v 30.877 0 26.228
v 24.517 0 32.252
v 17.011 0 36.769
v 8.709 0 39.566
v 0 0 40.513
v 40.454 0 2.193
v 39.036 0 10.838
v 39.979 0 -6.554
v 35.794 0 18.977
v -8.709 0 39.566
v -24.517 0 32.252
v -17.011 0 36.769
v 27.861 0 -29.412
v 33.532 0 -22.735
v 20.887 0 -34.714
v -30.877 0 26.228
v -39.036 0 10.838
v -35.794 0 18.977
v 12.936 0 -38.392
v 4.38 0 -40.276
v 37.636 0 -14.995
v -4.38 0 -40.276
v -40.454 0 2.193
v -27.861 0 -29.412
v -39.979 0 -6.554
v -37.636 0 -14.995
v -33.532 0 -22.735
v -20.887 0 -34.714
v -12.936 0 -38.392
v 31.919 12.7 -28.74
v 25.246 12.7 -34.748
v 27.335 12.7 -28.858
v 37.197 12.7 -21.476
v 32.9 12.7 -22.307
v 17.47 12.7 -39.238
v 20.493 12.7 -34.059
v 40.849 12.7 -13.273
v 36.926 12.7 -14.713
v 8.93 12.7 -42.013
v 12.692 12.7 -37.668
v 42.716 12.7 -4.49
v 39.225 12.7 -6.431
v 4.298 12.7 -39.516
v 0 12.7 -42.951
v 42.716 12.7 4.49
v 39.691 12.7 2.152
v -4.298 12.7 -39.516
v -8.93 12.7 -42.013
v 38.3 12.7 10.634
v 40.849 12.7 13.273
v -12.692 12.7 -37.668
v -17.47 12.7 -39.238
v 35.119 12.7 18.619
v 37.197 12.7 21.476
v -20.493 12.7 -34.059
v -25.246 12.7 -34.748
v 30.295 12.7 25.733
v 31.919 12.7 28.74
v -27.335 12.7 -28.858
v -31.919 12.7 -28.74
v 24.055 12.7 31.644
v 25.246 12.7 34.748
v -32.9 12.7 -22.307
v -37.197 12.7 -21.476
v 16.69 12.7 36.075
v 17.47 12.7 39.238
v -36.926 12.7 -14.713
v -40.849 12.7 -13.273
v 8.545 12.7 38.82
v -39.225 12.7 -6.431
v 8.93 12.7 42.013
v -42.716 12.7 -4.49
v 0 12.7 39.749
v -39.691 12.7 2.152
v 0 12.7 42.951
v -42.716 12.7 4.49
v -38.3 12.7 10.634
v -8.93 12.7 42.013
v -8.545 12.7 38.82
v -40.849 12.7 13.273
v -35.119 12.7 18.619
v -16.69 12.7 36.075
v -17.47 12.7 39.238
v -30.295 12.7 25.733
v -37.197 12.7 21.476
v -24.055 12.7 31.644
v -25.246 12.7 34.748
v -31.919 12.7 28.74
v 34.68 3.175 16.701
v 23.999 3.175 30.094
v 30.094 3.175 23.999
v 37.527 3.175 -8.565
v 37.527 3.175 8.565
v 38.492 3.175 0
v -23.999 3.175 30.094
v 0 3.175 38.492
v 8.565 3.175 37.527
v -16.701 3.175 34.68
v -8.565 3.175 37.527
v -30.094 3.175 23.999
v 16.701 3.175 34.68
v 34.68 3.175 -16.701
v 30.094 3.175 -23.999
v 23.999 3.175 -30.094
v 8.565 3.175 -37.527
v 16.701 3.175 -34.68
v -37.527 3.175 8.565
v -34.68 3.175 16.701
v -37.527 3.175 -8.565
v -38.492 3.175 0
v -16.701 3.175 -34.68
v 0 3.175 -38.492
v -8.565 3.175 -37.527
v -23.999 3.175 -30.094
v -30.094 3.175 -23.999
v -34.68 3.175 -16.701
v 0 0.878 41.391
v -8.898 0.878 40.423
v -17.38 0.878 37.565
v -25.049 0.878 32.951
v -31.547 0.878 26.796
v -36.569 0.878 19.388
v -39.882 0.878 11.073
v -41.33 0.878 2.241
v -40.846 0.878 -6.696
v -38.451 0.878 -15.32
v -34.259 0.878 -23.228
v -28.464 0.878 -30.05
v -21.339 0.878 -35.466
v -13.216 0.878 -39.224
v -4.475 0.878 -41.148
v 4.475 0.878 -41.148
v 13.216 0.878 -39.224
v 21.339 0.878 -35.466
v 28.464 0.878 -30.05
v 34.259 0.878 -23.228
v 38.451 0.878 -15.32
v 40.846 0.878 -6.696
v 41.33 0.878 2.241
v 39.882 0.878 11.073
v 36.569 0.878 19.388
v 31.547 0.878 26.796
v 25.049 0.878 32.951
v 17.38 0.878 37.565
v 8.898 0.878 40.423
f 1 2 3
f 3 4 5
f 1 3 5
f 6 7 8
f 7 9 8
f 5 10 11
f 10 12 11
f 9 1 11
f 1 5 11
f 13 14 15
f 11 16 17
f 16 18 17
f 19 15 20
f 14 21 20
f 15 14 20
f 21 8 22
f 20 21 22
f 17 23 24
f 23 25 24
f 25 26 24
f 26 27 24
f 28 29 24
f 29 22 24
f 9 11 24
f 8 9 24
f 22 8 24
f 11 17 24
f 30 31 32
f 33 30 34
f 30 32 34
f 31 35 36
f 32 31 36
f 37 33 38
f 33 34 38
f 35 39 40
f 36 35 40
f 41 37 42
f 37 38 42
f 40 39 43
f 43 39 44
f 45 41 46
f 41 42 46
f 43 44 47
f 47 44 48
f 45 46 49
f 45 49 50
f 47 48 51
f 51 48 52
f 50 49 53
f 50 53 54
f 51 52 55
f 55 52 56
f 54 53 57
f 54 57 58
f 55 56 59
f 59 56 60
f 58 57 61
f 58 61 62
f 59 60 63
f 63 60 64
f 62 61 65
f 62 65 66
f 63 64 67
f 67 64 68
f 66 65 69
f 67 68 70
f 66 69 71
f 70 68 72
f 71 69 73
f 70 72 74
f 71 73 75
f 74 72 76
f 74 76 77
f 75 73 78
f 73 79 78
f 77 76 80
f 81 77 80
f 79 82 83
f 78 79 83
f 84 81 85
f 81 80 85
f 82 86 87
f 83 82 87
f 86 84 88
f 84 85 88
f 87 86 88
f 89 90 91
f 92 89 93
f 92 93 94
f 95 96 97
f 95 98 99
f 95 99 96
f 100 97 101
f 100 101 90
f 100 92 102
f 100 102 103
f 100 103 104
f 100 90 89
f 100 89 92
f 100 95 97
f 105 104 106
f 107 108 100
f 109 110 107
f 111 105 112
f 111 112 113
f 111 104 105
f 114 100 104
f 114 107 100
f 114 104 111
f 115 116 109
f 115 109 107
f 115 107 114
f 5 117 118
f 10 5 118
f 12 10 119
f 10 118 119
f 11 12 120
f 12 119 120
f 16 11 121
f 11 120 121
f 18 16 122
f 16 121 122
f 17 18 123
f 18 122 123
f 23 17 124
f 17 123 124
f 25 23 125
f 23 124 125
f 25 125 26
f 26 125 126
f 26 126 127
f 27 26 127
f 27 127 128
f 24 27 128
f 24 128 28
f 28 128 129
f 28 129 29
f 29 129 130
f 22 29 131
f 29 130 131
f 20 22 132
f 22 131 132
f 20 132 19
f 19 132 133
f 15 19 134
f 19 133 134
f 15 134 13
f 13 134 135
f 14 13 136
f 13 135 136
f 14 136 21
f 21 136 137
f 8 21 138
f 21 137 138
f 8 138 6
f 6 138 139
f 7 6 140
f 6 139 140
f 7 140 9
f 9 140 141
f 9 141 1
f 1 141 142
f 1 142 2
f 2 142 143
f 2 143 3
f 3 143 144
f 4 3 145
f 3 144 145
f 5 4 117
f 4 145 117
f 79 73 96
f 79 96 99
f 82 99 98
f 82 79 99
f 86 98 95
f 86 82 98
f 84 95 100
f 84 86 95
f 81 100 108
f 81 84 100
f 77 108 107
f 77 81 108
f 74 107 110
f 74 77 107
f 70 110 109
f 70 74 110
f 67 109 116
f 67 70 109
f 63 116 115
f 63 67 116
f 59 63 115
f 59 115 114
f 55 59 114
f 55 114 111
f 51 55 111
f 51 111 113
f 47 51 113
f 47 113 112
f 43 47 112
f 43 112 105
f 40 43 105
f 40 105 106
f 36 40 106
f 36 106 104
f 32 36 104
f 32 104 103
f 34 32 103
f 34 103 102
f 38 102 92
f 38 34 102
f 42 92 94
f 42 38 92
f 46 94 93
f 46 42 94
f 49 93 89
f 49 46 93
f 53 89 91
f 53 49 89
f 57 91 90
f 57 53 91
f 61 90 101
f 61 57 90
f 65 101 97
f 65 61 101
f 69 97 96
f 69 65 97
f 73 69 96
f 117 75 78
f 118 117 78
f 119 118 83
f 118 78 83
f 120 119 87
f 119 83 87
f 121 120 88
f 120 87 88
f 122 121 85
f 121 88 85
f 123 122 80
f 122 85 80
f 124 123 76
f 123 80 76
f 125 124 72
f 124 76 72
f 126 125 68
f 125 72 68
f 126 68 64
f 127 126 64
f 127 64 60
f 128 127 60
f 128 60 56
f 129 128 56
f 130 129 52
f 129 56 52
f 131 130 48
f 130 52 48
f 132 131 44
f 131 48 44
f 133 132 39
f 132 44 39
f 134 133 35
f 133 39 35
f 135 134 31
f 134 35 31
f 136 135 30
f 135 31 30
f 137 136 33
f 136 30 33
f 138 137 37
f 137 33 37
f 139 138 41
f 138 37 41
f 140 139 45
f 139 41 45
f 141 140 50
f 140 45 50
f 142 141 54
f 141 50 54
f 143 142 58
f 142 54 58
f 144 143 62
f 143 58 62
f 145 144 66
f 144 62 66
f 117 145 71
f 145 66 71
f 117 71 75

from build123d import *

# Parameters (mm, degrees)
SHELL1_T       = -3.175
CHAMFER1_SIZE  = 0.762
CHAMFER1_SIZE2 = 0.885503909


with BuildPart() as part:
    # Sketch1 → Revolve1 (revolve)
    with BuildSketch(Plane(origin=(0, 0, 0), x_dir=(0, 0, -1), z_dir=(1, 0, 0)), mode=Mode.PRIVATE) as revolve1_sk:
        Polygon((0, 0), (41.275, 0), (42.9514969, 12.7), (0, 12.7), align=None)
    revolve(revolve1_sk.sketch.rotate(Axis((0, 0, 0), (0, -1, 0)), 180), axis=Axis((0, 0, 0), (0, -1, 0)))

    # Shell1
    shell1_openings = [part.faces().sort_by_distance(p)[0] for p in [
        (0, 12.7, 0),
    ]]
    offset(amount=SHELL1_T, openings=shell1_openings, kind=Kind.INTERSECTION)

    # Chamfer1
    chamfer1_edges = [part.edges().sort_by_distance(p)[0] for p in [
        (0, 0, -41.275),
    ]]
    chamfer1_side = [part.faces().sort_by_distance(p)[0] for p in [
        (0, 0, 0),
    ]]
    chamfer(chamfer1_edges, length=CHAMFER1_SIZE, length2=CHAMFER1_SIZE2, reference=chamfer1_side[0])


solid = part.part
